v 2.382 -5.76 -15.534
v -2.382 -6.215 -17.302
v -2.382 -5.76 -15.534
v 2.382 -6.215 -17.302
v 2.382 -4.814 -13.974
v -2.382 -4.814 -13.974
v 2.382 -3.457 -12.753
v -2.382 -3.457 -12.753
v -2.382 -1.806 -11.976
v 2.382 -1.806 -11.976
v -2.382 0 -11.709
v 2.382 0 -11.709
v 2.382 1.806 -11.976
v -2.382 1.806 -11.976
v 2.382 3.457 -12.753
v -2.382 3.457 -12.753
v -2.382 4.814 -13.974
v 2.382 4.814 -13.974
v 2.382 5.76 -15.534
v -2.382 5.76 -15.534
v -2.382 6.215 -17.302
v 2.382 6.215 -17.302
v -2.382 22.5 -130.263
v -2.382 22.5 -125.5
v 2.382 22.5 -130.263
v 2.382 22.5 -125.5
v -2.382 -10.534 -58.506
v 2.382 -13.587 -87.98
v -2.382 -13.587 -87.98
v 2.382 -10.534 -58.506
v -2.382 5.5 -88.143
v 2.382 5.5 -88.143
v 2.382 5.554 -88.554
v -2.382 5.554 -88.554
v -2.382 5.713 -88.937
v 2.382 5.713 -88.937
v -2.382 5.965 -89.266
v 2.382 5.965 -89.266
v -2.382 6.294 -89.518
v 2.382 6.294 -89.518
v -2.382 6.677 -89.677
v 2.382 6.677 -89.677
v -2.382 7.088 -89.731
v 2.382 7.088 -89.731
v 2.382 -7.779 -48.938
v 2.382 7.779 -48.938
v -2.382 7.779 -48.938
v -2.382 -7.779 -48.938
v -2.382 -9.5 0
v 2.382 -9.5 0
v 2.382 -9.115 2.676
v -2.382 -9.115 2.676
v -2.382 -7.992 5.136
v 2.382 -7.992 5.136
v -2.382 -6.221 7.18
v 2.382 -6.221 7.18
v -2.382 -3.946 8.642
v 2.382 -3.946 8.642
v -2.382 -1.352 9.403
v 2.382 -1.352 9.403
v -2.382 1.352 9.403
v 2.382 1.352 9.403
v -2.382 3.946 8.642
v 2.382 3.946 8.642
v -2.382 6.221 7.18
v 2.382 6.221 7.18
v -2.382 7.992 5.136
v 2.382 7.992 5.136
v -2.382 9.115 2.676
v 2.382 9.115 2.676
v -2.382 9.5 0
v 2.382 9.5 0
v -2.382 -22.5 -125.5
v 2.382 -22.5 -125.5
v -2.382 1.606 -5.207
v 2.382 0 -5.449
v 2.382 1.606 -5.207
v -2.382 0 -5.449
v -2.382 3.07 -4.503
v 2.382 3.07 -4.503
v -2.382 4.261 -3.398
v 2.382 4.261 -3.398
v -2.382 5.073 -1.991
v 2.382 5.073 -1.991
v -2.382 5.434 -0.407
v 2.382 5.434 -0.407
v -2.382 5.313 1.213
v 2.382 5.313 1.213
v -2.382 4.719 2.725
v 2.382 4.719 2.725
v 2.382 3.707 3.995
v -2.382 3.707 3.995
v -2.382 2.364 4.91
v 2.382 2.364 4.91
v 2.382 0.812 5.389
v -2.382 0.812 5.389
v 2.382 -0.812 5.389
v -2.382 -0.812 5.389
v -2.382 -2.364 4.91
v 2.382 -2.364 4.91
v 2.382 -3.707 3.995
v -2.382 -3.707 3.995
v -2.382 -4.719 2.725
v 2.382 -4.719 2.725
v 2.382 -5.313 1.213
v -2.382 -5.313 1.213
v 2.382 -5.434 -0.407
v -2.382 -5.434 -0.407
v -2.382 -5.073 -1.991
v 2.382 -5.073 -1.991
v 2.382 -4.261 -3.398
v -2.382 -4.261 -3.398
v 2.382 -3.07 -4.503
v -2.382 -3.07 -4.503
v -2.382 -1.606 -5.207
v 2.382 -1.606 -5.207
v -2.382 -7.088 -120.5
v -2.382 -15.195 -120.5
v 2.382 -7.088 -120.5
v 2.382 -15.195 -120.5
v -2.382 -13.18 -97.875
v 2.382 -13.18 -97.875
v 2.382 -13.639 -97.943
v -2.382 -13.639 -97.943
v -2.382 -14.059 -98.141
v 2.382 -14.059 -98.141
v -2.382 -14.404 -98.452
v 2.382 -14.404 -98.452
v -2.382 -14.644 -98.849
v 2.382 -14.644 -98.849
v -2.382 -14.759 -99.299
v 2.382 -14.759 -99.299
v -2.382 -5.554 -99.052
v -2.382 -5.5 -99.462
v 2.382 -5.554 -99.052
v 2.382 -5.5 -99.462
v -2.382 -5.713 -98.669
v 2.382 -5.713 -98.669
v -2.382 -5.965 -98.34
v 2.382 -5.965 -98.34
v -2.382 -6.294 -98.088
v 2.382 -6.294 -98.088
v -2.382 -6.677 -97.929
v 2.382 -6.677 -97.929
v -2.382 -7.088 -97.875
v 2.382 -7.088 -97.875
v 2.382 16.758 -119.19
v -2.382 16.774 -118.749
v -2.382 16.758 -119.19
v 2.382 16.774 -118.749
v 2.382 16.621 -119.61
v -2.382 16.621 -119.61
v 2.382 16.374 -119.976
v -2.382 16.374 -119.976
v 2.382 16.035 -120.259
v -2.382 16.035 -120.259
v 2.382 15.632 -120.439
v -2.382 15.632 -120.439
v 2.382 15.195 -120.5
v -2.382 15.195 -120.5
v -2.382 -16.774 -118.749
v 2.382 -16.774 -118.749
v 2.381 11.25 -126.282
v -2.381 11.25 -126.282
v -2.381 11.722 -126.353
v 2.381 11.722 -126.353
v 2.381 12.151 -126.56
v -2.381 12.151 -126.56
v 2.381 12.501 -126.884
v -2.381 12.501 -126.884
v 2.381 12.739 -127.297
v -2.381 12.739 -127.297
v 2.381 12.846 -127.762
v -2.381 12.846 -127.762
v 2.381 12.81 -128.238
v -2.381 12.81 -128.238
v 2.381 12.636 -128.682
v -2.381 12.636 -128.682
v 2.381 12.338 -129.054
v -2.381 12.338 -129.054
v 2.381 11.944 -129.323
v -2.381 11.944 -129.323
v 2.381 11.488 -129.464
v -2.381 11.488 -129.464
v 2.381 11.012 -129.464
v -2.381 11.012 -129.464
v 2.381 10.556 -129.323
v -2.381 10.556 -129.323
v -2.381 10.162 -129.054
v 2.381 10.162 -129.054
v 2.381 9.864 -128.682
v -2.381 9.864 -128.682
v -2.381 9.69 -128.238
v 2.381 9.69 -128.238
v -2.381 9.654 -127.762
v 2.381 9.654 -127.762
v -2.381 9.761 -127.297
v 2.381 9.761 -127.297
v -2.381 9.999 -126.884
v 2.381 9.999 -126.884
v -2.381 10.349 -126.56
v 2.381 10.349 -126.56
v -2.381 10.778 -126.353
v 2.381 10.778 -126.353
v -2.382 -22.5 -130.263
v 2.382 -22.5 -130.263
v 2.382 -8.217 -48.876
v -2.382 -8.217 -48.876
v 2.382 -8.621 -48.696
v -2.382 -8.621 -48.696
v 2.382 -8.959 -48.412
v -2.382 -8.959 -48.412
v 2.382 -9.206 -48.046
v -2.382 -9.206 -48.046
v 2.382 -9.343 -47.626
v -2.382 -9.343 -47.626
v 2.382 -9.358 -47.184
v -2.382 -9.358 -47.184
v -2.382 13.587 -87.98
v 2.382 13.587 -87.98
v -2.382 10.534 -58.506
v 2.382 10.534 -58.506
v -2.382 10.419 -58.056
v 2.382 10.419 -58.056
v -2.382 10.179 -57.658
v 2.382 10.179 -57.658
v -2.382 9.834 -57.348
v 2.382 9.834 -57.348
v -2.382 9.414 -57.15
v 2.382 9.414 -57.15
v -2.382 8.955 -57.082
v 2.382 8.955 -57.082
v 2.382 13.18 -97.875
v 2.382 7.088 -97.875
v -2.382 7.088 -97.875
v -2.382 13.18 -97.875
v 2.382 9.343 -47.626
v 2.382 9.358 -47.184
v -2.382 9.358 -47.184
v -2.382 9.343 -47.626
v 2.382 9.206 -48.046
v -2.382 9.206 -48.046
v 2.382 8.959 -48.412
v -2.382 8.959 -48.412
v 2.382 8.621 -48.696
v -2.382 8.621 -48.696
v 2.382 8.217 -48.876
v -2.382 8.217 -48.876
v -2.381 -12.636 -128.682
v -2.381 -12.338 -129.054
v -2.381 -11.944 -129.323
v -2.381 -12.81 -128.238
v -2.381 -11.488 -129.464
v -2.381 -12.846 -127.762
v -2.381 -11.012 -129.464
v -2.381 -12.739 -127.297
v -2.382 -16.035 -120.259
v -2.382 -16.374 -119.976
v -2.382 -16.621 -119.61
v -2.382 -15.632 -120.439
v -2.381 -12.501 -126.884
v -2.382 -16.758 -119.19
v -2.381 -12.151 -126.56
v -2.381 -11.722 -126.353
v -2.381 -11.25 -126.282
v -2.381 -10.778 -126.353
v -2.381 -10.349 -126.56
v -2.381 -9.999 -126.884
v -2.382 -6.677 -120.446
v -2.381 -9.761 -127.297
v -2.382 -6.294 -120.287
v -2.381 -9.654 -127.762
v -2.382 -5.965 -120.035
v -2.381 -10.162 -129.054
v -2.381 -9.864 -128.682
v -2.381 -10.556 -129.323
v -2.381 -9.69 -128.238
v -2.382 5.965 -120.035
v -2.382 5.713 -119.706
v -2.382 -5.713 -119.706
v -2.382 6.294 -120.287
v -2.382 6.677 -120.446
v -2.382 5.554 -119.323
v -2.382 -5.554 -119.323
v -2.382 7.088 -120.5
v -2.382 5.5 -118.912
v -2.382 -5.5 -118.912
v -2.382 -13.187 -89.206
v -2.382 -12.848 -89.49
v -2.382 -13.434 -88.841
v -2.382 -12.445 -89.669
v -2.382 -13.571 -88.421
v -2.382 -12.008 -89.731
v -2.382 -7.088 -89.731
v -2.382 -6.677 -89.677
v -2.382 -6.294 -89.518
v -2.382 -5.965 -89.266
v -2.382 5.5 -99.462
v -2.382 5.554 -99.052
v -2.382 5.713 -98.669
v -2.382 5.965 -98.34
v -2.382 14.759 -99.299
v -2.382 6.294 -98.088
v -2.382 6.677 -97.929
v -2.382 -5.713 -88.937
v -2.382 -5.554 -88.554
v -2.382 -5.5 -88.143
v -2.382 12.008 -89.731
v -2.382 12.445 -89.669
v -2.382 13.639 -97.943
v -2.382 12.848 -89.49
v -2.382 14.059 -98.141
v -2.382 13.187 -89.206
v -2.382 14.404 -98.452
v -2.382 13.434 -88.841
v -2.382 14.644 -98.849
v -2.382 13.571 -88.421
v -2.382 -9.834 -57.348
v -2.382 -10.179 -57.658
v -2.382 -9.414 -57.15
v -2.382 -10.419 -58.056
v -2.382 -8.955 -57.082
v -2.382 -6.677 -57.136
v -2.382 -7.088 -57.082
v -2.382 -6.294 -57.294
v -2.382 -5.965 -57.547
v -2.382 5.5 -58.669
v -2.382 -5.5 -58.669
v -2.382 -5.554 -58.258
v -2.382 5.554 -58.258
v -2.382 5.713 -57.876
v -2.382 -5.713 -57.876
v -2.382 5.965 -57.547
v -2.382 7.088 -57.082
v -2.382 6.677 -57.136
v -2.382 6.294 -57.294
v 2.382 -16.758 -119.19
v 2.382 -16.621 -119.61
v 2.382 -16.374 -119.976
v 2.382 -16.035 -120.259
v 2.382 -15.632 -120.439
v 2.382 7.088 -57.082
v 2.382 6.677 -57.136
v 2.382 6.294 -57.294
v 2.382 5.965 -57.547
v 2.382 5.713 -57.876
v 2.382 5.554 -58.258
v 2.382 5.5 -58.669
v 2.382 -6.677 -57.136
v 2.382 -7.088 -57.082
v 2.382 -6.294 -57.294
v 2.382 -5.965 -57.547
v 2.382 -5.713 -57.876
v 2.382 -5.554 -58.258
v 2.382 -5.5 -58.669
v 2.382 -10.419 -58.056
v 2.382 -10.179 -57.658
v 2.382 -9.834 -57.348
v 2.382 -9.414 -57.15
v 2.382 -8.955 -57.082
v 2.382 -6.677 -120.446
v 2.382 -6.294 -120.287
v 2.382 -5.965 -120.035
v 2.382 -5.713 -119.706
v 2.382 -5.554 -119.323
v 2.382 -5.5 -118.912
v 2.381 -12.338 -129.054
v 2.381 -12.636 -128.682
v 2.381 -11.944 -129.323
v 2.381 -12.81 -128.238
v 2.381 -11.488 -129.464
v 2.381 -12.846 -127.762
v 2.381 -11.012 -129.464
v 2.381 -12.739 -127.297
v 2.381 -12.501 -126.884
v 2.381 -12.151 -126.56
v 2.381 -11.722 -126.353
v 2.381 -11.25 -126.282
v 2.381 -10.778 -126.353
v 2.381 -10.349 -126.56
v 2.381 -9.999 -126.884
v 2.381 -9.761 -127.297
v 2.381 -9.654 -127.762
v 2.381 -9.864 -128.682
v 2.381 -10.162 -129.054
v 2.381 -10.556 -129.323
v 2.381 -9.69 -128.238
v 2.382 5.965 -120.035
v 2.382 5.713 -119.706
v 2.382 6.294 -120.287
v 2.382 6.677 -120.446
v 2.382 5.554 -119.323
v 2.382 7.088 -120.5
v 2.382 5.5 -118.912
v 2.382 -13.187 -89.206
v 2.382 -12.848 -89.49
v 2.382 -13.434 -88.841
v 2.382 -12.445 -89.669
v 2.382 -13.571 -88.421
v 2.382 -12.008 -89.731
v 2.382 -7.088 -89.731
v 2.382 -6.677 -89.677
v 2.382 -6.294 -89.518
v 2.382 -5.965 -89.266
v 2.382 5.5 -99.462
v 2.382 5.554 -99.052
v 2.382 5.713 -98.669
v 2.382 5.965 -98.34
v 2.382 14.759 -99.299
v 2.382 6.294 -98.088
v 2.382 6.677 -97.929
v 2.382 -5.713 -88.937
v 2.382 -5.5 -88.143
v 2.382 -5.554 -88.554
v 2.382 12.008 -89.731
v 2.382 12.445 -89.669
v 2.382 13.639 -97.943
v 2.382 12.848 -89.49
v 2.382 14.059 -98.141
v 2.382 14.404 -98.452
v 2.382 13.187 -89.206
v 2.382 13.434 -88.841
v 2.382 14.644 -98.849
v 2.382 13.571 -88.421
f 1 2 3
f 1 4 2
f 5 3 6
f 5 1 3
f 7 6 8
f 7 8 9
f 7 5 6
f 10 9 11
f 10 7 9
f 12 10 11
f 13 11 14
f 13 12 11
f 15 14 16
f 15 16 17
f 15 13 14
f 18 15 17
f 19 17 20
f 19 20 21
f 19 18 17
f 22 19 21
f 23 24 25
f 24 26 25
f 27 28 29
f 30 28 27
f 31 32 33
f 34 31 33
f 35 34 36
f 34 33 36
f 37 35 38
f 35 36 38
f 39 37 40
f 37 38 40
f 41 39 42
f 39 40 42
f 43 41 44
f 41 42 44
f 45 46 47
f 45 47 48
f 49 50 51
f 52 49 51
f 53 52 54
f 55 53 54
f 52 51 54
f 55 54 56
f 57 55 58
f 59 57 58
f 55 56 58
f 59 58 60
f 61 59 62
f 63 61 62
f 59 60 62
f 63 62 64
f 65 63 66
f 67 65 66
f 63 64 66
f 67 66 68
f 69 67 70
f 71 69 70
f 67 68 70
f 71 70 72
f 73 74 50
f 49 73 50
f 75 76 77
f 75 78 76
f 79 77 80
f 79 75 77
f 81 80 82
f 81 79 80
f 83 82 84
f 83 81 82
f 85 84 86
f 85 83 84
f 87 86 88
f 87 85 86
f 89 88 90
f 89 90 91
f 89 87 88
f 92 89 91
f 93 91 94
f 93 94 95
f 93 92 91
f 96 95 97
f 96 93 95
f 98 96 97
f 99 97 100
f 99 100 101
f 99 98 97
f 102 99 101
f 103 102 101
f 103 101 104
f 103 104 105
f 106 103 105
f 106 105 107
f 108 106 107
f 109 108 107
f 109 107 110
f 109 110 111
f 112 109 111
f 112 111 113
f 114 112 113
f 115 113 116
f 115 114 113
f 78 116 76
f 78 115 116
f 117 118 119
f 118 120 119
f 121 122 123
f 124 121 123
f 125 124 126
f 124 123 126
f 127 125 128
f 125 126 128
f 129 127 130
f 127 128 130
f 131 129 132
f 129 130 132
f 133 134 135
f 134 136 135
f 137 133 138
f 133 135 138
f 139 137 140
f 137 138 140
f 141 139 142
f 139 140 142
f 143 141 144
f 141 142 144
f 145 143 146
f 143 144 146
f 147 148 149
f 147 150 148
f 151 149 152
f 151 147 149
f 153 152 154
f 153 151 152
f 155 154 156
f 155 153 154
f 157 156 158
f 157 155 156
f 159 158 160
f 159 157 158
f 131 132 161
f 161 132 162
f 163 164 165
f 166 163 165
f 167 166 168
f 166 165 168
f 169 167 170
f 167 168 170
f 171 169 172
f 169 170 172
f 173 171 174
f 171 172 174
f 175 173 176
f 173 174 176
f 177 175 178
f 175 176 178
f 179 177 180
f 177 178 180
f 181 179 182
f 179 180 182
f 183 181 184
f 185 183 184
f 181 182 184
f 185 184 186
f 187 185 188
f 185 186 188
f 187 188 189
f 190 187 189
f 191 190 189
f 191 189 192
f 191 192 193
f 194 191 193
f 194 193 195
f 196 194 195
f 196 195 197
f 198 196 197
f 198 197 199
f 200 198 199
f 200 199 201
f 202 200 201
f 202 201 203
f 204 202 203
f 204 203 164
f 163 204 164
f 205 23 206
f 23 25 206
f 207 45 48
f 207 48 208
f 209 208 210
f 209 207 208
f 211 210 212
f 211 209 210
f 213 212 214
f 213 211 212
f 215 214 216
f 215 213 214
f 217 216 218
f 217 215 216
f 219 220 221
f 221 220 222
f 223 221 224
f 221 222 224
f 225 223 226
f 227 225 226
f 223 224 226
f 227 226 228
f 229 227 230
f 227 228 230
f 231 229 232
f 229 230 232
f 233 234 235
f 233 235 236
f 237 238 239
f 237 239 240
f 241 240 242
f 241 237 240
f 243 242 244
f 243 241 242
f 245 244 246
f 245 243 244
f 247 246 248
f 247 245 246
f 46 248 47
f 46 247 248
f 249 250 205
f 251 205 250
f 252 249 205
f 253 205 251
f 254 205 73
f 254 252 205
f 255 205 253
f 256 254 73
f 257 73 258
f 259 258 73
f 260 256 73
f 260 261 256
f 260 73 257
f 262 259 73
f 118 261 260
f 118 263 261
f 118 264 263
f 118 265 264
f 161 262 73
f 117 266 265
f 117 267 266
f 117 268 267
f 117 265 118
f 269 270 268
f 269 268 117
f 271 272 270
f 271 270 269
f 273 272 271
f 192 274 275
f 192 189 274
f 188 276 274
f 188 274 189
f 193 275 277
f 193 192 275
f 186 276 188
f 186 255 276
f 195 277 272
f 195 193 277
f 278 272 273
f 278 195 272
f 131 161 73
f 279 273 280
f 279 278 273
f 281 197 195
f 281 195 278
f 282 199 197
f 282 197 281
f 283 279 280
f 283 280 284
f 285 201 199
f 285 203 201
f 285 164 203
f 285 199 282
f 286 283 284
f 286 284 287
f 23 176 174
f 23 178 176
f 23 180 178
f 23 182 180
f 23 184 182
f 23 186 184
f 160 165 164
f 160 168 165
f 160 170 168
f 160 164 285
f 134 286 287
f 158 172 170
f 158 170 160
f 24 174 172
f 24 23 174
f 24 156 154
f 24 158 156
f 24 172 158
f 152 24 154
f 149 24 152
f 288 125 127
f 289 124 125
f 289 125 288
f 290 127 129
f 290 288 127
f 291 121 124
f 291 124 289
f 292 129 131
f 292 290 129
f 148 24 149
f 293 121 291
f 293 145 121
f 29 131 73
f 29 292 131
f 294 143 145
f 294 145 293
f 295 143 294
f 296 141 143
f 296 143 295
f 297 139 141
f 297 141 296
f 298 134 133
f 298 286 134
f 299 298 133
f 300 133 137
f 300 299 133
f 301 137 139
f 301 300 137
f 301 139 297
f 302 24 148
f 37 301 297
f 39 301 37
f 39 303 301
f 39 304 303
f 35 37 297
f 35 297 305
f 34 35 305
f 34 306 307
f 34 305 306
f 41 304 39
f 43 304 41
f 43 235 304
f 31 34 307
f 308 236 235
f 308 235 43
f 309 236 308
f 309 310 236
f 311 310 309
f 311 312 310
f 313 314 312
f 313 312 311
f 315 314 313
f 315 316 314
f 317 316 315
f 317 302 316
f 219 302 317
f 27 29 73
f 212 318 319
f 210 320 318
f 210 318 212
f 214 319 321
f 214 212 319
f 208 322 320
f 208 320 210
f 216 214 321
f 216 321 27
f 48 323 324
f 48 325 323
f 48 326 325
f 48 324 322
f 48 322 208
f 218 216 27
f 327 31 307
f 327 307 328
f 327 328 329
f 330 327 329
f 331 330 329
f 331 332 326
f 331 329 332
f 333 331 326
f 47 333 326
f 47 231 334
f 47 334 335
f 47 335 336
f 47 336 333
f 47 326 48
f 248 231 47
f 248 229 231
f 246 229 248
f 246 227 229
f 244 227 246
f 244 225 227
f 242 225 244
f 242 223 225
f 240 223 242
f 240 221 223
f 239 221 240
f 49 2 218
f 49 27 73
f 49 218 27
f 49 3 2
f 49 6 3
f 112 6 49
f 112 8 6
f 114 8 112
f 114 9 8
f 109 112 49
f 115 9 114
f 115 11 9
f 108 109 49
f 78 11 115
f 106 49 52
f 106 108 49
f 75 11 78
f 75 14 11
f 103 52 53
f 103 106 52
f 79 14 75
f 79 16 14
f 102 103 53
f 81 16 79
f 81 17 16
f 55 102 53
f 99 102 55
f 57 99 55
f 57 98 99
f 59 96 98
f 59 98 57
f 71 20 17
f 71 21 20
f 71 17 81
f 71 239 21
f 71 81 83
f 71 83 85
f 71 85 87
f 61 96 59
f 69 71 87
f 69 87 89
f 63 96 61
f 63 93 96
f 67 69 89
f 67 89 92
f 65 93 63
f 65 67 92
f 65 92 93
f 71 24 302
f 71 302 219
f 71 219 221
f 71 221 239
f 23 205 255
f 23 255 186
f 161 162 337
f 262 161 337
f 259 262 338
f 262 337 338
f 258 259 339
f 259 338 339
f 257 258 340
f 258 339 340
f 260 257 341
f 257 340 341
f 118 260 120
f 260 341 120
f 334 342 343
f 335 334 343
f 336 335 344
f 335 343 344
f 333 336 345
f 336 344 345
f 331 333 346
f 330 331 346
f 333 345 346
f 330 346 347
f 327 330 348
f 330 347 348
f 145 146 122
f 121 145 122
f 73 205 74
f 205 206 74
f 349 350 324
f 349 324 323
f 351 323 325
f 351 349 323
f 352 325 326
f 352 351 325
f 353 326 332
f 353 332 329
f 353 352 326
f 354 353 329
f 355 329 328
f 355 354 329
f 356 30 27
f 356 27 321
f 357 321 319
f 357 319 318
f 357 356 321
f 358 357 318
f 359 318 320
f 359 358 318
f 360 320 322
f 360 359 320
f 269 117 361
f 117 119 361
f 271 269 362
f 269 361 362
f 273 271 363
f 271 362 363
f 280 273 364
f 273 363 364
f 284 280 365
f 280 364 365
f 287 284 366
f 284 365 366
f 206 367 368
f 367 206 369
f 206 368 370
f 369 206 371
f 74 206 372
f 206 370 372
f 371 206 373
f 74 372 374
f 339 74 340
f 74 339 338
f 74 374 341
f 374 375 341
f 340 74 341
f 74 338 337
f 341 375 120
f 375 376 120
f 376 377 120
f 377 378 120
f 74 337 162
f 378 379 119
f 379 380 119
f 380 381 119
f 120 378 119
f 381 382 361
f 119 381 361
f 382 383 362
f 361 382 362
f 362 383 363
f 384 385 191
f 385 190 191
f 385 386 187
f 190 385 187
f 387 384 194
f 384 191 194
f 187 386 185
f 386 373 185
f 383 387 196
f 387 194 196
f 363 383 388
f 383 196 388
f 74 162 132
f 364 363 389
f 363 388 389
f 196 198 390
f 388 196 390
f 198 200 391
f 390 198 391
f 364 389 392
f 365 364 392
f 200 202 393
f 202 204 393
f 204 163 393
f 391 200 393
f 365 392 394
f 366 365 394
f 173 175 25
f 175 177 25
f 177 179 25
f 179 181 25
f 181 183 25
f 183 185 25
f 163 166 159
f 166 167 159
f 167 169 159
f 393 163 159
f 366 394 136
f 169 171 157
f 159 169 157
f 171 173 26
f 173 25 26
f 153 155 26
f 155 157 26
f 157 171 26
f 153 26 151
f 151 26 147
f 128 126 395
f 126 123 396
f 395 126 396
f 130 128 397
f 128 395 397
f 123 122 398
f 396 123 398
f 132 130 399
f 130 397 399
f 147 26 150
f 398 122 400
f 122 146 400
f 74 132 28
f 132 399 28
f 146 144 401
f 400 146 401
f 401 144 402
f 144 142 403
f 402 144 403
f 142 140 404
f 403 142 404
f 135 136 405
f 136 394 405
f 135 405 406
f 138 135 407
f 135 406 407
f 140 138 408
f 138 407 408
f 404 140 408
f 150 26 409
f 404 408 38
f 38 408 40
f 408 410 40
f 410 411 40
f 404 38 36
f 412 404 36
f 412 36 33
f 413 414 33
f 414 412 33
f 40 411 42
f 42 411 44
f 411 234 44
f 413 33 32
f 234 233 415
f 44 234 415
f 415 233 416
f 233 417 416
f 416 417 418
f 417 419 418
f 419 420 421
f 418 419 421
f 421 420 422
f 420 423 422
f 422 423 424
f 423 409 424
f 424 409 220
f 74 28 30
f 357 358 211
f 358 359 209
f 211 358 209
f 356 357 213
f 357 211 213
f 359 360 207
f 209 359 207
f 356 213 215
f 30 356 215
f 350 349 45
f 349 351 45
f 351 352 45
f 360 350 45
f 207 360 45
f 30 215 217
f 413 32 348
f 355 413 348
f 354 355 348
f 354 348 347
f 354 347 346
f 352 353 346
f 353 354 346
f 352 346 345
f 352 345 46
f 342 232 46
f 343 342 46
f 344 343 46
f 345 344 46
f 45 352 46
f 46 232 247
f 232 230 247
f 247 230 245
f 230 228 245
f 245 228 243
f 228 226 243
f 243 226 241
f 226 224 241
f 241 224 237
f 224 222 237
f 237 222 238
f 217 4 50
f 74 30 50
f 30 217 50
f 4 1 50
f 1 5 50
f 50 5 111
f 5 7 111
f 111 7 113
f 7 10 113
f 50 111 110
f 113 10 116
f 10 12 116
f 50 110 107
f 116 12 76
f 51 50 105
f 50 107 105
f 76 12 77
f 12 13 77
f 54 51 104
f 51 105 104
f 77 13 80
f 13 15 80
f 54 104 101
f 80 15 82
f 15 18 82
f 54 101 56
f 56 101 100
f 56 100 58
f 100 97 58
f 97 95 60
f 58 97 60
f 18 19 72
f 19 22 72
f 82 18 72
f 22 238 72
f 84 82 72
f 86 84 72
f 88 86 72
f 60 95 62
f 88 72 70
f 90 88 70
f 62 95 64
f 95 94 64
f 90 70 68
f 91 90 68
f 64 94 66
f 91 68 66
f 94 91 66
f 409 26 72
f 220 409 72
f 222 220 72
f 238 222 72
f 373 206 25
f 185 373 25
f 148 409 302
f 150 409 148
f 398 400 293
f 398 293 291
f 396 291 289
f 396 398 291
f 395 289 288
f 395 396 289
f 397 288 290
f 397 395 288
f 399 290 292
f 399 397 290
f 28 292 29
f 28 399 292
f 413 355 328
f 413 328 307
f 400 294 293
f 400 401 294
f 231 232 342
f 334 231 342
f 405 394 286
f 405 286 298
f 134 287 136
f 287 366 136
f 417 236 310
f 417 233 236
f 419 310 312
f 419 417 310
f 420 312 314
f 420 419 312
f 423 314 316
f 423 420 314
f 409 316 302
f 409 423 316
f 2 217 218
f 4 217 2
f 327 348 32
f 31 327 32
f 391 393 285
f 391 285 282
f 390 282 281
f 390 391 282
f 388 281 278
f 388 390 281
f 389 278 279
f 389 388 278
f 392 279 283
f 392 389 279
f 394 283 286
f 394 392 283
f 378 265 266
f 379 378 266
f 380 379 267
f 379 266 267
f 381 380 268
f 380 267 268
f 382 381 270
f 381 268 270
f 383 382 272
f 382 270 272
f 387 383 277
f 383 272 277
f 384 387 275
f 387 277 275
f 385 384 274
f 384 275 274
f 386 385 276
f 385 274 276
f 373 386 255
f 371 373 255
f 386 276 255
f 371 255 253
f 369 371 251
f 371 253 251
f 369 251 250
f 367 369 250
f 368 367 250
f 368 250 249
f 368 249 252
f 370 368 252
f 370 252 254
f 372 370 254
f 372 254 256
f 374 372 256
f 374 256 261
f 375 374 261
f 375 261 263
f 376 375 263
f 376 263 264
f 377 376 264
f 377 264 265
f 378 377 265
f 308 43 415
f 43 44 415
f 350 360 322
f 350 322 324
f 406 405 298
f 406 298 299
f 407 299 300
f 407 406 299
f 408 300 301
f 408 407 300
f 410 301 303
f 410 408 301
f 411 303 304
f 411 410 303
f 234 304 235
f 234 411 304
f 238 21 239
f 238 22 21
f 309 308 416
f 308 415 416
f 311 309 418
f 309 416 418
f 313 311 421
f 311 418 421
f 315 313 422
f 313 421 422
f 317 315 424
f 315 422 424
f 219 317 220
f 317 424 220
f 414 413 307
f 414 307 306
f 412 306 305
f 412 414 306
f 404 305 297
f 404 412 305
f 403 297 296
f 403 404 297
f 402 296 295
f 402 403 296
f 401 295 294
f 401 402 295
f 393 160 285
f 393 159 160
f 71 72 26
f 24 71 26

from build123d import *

# Parameters (mm, degrees)
SKETCH1_R            = 5.44942
BOSS_EXTRUDE1_DEPTH  = 2.3815
M3_CLEARANCE_HOLE1_D = 3.2


with BuildPart() as part:
    # Sketch1 → Boss-Extrude1 (new body, symmetric)
    with BuildSketch(Plane(origin=(0, 0, 0), x_dir=(0, 0, -1), z_dir=(1, 0, 0))):
        with BuildLine():
            Line((0, 9.5), (125.5, 22.5))
            Line((125.5, 22.5), (130.263, 22.5))
            Line((130.263, 22.5), (130.263, -22.5))
            Line((130.263, -22.5), (125.5, -22.5))
            Line((125.5, -22.5), (0, -9.5))
            ThreePointArc((0, -9.5), (-9.5, 0), (0, 9.5))
        make_face()
        Circle(SKETCH1_R, mode=Mode.SUBTRACT)
        with BuildLine():
            Line((17.302023212, 6.21531268), (47.183955708, 9.358046468))
            ThreePointArc((47.183955708, 9.358046468), (48.412205474, 8.959031889), (48.9375, 7.779254036))
            Line((48.9375, 7.779254036), (48.9375, -7.779257299))
            ThreePointArc((48.9375, -7.779257299), (48.412206559, -8.959034175), (47.183958614, -9.358050037))
            Line((47.183958614, -9.358050037), (17.302047548, -6.215374112))
            ThreePointArc((17.302047548, -6.215374112), (11.709307369, -4.1665e-05), (17.302023212, 6.21531268))
        make_face(mode=Mode.SUBTRACT)
        with BuildLine():
            Line((120.5, 15.194881882), (120.5, 7.0875))
            ThreePointArc((120.5, 7.0875), (120.035032015, 5.964967985), (118.9125, 5.5))
            Line((118.9125, 5.5), (99.4625, 5.5))
            ThreePointArc((99.4625, 5.5), (98.339967985, 5.964967985), (97.875, 7.0875))
            Line((97.875, 7.0875), (97.875, 13.180140846))
            ThreePointArc((97.875, 13.180140846), (98.283555786, 14.243271501), (99.298932964, 14.759191851))
            Line((99.298932964, 14.759191851), (118.748932964, 16.773932886))
            ThreePointArc((118.748932964, 16.773932886), (119.975630655, 16.373826096), (120.5, 15.194881882))
        make_face(mode=Mode.SUBTRACT)
        with BuildLine():
            Line((120.5, -15.194881882), (120.5, -7.0875))
            ThreePointArc((120.5, -7.0875), (120.035032015, -5.964967985), (118.9125, -5.5))
            Line((118.9125, -5.5), (99.4625, -5.5))
            ThreePointArc((99.4625, -5.5), (98.339967985, -5.964967985), (97.875, -7.0875))
            Line((97.875, -7.0875), (97.875, -13.180140846))
            ThreePointArc((97.875, -13.180140846), (98.283555786, -14.243271501), (99.298932964, -14.759191851))
            Line((99.298932964, -14.759191851), (118.748932964, -16.773932886))
            ThreePointArc((118.748932964, -16.773932886), (119.975630655, -16.373826096), (120.5, -15.194881882))
        make_face(mode=Mode.SUBTRACT)
        with BuildLine():
            Line((89.73075, 7.0875), (89.73075, 12.007628894))
            ThreePointArc((89.73075, 12.007628894), (89.206380655, 13.186573108), (87.979682964, 13.586679898))
            Line((87.979682964, 13.586679898), (58.505682964, 10.533596233))
            ThreePointArc((58.505682964, 10.533596233), (57.490305786, 10.017675884), (57.08175, 8.954545229))
            Line((57.08175, 8.954545229), (57.08175, 7.0875))
            ThreePointArc((57.08175, 7.0875), (57.546717985, 5.964967985), (58.66925, 5.5))
            Line((58.66925, 5.5), (88.14325, 5.5))
            ThreePointArc((88.14325, 5.5), (89.265782015, 5.964967985), (89.73075, 7.0875))
        make_face(mode=Mode.SUBTRACT)
        with BuildLine():
            Line((89.73075, -7.0875), (89.73075, -12.007628894))
            ThreePointArc((89.73075, -12.007628894), (89.206380655, -13.186573108), (87.979682964, -13.586679898))
            Line((87.979682964, -13.586679898), (58.505682964, -10.533596233))
            ThreePointArc((58.505682964, -10.533596233), (57.490305786, -10.017675884), (57.08175, -8.954545229))
            Line((57.08175, -8.954545229), (57.08175, -7.0875))
            ThreePointArc((57.08175, -7.0875), (57.546717985, -5.964967985), (58.66925, -5.5))
            Line((58.66925, -5.5), (88.14325, -5.5))
            ThreePointArc((88.14325, -5.5), (89.265782015, -5.964967985), (89.73075, -7.0875))
        make_face(mode=Mode.SUBTRACT)
    extrude(amount=BOSS_EXTRUDE1_DEPTH, both=True)

    # M3 Clearance Hole1 (through all)
    with Locations(Plane(origin=(2.3815, 0, 0), x_dir=(0, 0, -1), z_dir=(1, 0, 0))):
        with Locations((127.8815, 11.25), (127.8815, -11.25)):
            Hole(M3_CLEARANCE_HOLE1_D / 2)


solid = part.part
